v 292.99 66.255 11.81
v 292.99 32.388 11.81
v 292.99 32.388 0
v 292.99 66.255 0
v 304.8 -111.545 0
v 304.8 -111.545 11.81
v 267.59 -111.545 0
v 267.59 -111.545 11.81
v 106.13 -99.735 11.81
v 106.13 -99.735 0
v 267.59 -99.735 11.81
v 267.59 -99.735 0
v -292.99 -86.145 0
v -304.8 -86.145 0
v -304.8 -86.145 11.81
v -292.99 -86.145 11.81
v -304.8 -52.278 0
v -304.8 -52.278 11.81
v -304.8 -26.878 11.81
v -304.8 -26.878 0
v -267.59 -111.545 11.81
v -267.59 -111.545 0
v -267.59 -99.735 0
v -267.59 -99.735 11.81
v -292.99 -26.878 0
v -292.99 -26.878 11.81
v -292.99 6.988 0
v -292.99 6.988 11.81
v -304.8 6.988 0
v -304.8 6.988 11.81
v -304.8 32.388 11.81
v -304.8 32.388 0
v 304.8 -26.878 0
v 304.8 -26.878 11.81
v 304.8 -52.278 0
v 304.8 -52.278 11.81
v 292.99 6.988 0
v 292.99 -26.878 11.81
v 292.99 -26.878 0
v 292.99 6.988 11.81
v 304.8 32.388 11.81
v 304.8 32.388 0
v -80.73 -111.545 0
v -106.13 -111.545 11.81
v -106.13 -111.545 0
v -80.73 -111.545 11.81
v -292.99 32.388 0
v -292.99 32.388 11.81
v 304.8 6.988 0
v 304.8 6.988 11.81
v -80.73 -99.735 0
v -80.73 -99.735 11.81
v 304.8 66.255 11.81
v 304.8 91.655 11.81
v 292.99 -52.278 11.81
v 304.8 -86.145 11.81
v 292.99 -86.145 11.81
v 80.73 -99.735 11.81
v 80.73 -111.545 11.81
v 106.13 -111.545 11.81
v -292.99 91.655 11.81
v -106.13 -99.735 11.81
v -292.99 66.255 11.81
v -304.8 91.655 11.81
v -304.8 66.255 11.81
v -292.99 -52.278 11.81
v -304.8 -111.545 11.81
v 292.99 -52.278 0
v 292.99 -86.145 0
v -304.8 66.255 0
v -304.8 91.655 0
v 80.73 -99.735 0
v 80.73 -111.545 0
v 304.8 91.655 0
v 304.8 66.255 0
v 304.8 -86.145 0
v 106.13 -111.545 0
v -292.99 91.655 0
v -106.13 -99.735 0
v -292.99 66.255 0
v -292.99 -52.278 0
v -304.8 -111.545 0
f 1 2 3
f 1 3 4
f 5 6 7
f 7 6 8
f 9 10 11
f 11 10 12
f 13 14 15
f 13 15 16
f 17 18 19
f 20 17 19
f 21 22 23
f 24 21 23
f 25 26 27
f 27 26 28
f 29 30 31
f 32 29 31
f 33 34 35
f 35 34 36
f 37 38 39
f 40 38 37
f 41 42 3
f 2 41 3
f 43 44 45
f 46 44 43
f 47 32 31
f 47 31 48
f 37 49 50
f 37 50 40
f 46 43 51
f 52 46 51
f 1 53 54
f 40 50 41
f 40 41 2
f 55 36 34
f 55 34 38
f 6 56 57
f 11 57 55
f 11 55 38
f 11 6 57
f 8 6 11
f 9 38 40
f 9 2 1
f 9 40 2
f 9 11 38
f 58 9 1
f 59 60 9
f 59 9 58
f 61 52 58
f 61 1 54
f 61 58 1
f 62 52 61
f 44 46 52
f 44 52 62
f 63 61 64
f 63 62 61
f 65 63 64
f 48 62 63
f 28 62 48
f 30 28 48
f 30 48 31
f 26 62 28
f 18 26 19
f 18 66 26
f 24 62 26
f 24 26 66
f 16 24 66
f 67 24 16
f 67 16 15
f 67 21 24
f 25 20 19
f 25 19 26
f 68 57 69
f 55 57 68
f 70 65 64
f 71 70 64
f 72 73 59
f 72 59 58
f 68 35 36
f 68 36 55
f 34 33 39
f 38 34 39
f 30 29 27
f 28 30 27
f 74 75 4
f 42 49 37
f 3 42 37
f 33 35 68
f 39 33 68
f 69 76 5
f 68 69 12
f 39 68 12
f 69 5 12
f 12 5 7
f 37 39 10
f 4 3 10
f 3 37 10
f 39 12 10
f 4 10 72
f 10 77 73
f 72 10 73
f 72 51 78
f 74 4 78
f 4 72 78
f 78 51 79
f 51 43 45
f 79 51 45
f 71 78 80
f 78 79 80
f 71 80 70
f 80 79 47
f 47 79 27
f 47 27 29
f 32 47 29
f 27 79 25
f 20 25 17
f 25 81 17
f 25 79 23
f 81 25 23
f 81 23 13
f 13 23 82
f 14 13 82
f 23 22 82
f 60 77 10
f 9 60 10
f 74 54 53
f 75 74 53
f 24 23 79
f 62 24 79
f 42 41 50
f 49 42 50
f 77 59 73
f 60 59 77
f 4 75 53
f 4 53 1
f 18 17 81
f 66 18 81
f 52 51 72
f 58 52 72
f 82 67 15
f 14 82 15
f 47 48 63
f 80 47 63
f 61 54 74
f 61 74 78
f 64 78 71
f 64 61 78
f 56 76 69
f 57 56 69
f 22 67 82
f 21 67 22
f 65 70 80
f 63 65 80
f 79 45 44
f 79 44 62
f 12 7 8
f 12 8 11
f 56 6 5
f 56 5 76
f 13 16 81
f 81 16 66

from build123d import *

# Parameters (mm, degrees)
BASE_SKETCH_W           = 585.98
BASE_SKETCH_H           = 191.39
BOSS_EXTRUDE1_DEPTH     = 11.81
JOINT_X_W               = 25.4
JOINT_X_H               = 11.81
BOSS_EXTRUDE2_DEPTH     = 11.81
LPATTERN1_COUNT         = 4
LPATTERN1_PITCH         = 186.86
JOINT_Y_W               = 11.81
JOINT_Y_H               = 25.4
BOSS_EXTRUDE3_DEPTH     = 11.81
LPATTERN2_COUNT         = 4
LPATTERN2_PITCH         = 59.266666667
MIRROR3_COPY_1_SKETCH_W = 11.81
MIRROR3_COPY_1_SKETCH_H = 25.4
MIRROR3_COPY_1_DEPTH    = 11.81
MIRROR3_COPY_2_SKETCH_W = 11.81
MIRROR3_COPY_2_SKETCH_H = 25.4
MIRROR3_COPY_2_DEPTH    = 11.81
MIRROR3_COPY_3_SKETCH_W = 11.81
MIRROR3_COPY_3_SKETCH_H = 25.4
MIRROR3_COPY_3_DEPTH    = 11.81


with BuildPart() as part:
    # Base_Sketch → Boss-Extrude1 (new body)
    with BuildSketch(Plane.XY):
        with Locations((0, -4.040082085)):
            Rectangle(BASE_SKETCH_W, BASE_SKETCH_H)
    extrude(amount=BOSS_EXTRUDE1_DEPTH)

    # Joint_X → Boss-Extrude2 (add)
    with BuildSketch(Plane.XY.offset(11.81)):
        with Locations((-280.29, -105.640082085)):
            Rectangle(JOINT_X_W, JOINT_X_H)
    boss_extrude2 = extrude(amount=-BOSS_EXTRUDE2_DEPTH)

    # LPattern1: Boss-Extrude2 ×4
    with Locations(*[(i * LPATTERN1_PITCH, 0, 0) for i in range(1, LPATTERN1_COUNT)]):
        add(boss_extrude2)

    # Joint_Y → Boss-Extrude3 (add)
    with BuildSketch(Plane.XY.offset(11.81)):
        with Locations((-298.895, -98.845082085)):
            Rectangle(JOINT_Y_W, JOINT_Y_H)
    boss_extrude3 = extrude(amount=-BOSS_EXTRUDE3_DEPTH)

    # LPattern2: Boss-Extrude3 ×4
    with Locations(*[(0, i * LPATTERN2_PITCH, 0) for i in range(1, LPATTERN2_COUNT)]):
        add(boss_extrude3)

    # Mirror3: Boss-Extrude3 across plane
    add(boss_extrude3.mirror(Plane.ZY))

    # Mirror3 copy 1 sketch → Mirror3 copy 1 (add)
    with BuildSketch(Plane(origin=(0, 59.266666667, 11.81), x_dir=(-1, 0, 0), z_dir=(0, 0, 1))):
        with Locations((-298.895, 98.845082085)):
            Rectangle(MIRROR3_COPY_1_SKETCH_W, MIRROR3_COPY_1_SKETCH_H)
    extrude(amount=-MIRROR3_COPY_1_DEPTH)

    # Mirror3 copy 2 sketch → Mirror3 copy 2 (add)
    with BuildSketch(Plane(origin=(0, 118.533333333, 11.81), x_dir=(-1, 0, 0), z_dir=(0, 0, 1))):
        with Locations((-298.895, 98.845082085)):
            Rectangle(MIRROR3_COPY_2_SKETCH_W, MIRROR3_COPY_2_SKETCH_H)
    extrude(amount=-MIRROR3_COPY_2_DEPTH)

    # Mirror3 copy 3 sketch → Mirror3 copy 3 (add)
    with BuildSketch(Plane(origin=(0, 177.8, 11.81), x_dir=(-1, 0, 0), z_dir=(0, 0, 1))):
        with Locations((-298.895, 98.845082085)):
            Rectangle(MIRROR3_COPY_3_SKETCH_W, MIRROR3_COPY_3_SKETCH_H)
    extrude(amount=-MIRROR3_COPY_3_DEPTH)


solid = part.part
